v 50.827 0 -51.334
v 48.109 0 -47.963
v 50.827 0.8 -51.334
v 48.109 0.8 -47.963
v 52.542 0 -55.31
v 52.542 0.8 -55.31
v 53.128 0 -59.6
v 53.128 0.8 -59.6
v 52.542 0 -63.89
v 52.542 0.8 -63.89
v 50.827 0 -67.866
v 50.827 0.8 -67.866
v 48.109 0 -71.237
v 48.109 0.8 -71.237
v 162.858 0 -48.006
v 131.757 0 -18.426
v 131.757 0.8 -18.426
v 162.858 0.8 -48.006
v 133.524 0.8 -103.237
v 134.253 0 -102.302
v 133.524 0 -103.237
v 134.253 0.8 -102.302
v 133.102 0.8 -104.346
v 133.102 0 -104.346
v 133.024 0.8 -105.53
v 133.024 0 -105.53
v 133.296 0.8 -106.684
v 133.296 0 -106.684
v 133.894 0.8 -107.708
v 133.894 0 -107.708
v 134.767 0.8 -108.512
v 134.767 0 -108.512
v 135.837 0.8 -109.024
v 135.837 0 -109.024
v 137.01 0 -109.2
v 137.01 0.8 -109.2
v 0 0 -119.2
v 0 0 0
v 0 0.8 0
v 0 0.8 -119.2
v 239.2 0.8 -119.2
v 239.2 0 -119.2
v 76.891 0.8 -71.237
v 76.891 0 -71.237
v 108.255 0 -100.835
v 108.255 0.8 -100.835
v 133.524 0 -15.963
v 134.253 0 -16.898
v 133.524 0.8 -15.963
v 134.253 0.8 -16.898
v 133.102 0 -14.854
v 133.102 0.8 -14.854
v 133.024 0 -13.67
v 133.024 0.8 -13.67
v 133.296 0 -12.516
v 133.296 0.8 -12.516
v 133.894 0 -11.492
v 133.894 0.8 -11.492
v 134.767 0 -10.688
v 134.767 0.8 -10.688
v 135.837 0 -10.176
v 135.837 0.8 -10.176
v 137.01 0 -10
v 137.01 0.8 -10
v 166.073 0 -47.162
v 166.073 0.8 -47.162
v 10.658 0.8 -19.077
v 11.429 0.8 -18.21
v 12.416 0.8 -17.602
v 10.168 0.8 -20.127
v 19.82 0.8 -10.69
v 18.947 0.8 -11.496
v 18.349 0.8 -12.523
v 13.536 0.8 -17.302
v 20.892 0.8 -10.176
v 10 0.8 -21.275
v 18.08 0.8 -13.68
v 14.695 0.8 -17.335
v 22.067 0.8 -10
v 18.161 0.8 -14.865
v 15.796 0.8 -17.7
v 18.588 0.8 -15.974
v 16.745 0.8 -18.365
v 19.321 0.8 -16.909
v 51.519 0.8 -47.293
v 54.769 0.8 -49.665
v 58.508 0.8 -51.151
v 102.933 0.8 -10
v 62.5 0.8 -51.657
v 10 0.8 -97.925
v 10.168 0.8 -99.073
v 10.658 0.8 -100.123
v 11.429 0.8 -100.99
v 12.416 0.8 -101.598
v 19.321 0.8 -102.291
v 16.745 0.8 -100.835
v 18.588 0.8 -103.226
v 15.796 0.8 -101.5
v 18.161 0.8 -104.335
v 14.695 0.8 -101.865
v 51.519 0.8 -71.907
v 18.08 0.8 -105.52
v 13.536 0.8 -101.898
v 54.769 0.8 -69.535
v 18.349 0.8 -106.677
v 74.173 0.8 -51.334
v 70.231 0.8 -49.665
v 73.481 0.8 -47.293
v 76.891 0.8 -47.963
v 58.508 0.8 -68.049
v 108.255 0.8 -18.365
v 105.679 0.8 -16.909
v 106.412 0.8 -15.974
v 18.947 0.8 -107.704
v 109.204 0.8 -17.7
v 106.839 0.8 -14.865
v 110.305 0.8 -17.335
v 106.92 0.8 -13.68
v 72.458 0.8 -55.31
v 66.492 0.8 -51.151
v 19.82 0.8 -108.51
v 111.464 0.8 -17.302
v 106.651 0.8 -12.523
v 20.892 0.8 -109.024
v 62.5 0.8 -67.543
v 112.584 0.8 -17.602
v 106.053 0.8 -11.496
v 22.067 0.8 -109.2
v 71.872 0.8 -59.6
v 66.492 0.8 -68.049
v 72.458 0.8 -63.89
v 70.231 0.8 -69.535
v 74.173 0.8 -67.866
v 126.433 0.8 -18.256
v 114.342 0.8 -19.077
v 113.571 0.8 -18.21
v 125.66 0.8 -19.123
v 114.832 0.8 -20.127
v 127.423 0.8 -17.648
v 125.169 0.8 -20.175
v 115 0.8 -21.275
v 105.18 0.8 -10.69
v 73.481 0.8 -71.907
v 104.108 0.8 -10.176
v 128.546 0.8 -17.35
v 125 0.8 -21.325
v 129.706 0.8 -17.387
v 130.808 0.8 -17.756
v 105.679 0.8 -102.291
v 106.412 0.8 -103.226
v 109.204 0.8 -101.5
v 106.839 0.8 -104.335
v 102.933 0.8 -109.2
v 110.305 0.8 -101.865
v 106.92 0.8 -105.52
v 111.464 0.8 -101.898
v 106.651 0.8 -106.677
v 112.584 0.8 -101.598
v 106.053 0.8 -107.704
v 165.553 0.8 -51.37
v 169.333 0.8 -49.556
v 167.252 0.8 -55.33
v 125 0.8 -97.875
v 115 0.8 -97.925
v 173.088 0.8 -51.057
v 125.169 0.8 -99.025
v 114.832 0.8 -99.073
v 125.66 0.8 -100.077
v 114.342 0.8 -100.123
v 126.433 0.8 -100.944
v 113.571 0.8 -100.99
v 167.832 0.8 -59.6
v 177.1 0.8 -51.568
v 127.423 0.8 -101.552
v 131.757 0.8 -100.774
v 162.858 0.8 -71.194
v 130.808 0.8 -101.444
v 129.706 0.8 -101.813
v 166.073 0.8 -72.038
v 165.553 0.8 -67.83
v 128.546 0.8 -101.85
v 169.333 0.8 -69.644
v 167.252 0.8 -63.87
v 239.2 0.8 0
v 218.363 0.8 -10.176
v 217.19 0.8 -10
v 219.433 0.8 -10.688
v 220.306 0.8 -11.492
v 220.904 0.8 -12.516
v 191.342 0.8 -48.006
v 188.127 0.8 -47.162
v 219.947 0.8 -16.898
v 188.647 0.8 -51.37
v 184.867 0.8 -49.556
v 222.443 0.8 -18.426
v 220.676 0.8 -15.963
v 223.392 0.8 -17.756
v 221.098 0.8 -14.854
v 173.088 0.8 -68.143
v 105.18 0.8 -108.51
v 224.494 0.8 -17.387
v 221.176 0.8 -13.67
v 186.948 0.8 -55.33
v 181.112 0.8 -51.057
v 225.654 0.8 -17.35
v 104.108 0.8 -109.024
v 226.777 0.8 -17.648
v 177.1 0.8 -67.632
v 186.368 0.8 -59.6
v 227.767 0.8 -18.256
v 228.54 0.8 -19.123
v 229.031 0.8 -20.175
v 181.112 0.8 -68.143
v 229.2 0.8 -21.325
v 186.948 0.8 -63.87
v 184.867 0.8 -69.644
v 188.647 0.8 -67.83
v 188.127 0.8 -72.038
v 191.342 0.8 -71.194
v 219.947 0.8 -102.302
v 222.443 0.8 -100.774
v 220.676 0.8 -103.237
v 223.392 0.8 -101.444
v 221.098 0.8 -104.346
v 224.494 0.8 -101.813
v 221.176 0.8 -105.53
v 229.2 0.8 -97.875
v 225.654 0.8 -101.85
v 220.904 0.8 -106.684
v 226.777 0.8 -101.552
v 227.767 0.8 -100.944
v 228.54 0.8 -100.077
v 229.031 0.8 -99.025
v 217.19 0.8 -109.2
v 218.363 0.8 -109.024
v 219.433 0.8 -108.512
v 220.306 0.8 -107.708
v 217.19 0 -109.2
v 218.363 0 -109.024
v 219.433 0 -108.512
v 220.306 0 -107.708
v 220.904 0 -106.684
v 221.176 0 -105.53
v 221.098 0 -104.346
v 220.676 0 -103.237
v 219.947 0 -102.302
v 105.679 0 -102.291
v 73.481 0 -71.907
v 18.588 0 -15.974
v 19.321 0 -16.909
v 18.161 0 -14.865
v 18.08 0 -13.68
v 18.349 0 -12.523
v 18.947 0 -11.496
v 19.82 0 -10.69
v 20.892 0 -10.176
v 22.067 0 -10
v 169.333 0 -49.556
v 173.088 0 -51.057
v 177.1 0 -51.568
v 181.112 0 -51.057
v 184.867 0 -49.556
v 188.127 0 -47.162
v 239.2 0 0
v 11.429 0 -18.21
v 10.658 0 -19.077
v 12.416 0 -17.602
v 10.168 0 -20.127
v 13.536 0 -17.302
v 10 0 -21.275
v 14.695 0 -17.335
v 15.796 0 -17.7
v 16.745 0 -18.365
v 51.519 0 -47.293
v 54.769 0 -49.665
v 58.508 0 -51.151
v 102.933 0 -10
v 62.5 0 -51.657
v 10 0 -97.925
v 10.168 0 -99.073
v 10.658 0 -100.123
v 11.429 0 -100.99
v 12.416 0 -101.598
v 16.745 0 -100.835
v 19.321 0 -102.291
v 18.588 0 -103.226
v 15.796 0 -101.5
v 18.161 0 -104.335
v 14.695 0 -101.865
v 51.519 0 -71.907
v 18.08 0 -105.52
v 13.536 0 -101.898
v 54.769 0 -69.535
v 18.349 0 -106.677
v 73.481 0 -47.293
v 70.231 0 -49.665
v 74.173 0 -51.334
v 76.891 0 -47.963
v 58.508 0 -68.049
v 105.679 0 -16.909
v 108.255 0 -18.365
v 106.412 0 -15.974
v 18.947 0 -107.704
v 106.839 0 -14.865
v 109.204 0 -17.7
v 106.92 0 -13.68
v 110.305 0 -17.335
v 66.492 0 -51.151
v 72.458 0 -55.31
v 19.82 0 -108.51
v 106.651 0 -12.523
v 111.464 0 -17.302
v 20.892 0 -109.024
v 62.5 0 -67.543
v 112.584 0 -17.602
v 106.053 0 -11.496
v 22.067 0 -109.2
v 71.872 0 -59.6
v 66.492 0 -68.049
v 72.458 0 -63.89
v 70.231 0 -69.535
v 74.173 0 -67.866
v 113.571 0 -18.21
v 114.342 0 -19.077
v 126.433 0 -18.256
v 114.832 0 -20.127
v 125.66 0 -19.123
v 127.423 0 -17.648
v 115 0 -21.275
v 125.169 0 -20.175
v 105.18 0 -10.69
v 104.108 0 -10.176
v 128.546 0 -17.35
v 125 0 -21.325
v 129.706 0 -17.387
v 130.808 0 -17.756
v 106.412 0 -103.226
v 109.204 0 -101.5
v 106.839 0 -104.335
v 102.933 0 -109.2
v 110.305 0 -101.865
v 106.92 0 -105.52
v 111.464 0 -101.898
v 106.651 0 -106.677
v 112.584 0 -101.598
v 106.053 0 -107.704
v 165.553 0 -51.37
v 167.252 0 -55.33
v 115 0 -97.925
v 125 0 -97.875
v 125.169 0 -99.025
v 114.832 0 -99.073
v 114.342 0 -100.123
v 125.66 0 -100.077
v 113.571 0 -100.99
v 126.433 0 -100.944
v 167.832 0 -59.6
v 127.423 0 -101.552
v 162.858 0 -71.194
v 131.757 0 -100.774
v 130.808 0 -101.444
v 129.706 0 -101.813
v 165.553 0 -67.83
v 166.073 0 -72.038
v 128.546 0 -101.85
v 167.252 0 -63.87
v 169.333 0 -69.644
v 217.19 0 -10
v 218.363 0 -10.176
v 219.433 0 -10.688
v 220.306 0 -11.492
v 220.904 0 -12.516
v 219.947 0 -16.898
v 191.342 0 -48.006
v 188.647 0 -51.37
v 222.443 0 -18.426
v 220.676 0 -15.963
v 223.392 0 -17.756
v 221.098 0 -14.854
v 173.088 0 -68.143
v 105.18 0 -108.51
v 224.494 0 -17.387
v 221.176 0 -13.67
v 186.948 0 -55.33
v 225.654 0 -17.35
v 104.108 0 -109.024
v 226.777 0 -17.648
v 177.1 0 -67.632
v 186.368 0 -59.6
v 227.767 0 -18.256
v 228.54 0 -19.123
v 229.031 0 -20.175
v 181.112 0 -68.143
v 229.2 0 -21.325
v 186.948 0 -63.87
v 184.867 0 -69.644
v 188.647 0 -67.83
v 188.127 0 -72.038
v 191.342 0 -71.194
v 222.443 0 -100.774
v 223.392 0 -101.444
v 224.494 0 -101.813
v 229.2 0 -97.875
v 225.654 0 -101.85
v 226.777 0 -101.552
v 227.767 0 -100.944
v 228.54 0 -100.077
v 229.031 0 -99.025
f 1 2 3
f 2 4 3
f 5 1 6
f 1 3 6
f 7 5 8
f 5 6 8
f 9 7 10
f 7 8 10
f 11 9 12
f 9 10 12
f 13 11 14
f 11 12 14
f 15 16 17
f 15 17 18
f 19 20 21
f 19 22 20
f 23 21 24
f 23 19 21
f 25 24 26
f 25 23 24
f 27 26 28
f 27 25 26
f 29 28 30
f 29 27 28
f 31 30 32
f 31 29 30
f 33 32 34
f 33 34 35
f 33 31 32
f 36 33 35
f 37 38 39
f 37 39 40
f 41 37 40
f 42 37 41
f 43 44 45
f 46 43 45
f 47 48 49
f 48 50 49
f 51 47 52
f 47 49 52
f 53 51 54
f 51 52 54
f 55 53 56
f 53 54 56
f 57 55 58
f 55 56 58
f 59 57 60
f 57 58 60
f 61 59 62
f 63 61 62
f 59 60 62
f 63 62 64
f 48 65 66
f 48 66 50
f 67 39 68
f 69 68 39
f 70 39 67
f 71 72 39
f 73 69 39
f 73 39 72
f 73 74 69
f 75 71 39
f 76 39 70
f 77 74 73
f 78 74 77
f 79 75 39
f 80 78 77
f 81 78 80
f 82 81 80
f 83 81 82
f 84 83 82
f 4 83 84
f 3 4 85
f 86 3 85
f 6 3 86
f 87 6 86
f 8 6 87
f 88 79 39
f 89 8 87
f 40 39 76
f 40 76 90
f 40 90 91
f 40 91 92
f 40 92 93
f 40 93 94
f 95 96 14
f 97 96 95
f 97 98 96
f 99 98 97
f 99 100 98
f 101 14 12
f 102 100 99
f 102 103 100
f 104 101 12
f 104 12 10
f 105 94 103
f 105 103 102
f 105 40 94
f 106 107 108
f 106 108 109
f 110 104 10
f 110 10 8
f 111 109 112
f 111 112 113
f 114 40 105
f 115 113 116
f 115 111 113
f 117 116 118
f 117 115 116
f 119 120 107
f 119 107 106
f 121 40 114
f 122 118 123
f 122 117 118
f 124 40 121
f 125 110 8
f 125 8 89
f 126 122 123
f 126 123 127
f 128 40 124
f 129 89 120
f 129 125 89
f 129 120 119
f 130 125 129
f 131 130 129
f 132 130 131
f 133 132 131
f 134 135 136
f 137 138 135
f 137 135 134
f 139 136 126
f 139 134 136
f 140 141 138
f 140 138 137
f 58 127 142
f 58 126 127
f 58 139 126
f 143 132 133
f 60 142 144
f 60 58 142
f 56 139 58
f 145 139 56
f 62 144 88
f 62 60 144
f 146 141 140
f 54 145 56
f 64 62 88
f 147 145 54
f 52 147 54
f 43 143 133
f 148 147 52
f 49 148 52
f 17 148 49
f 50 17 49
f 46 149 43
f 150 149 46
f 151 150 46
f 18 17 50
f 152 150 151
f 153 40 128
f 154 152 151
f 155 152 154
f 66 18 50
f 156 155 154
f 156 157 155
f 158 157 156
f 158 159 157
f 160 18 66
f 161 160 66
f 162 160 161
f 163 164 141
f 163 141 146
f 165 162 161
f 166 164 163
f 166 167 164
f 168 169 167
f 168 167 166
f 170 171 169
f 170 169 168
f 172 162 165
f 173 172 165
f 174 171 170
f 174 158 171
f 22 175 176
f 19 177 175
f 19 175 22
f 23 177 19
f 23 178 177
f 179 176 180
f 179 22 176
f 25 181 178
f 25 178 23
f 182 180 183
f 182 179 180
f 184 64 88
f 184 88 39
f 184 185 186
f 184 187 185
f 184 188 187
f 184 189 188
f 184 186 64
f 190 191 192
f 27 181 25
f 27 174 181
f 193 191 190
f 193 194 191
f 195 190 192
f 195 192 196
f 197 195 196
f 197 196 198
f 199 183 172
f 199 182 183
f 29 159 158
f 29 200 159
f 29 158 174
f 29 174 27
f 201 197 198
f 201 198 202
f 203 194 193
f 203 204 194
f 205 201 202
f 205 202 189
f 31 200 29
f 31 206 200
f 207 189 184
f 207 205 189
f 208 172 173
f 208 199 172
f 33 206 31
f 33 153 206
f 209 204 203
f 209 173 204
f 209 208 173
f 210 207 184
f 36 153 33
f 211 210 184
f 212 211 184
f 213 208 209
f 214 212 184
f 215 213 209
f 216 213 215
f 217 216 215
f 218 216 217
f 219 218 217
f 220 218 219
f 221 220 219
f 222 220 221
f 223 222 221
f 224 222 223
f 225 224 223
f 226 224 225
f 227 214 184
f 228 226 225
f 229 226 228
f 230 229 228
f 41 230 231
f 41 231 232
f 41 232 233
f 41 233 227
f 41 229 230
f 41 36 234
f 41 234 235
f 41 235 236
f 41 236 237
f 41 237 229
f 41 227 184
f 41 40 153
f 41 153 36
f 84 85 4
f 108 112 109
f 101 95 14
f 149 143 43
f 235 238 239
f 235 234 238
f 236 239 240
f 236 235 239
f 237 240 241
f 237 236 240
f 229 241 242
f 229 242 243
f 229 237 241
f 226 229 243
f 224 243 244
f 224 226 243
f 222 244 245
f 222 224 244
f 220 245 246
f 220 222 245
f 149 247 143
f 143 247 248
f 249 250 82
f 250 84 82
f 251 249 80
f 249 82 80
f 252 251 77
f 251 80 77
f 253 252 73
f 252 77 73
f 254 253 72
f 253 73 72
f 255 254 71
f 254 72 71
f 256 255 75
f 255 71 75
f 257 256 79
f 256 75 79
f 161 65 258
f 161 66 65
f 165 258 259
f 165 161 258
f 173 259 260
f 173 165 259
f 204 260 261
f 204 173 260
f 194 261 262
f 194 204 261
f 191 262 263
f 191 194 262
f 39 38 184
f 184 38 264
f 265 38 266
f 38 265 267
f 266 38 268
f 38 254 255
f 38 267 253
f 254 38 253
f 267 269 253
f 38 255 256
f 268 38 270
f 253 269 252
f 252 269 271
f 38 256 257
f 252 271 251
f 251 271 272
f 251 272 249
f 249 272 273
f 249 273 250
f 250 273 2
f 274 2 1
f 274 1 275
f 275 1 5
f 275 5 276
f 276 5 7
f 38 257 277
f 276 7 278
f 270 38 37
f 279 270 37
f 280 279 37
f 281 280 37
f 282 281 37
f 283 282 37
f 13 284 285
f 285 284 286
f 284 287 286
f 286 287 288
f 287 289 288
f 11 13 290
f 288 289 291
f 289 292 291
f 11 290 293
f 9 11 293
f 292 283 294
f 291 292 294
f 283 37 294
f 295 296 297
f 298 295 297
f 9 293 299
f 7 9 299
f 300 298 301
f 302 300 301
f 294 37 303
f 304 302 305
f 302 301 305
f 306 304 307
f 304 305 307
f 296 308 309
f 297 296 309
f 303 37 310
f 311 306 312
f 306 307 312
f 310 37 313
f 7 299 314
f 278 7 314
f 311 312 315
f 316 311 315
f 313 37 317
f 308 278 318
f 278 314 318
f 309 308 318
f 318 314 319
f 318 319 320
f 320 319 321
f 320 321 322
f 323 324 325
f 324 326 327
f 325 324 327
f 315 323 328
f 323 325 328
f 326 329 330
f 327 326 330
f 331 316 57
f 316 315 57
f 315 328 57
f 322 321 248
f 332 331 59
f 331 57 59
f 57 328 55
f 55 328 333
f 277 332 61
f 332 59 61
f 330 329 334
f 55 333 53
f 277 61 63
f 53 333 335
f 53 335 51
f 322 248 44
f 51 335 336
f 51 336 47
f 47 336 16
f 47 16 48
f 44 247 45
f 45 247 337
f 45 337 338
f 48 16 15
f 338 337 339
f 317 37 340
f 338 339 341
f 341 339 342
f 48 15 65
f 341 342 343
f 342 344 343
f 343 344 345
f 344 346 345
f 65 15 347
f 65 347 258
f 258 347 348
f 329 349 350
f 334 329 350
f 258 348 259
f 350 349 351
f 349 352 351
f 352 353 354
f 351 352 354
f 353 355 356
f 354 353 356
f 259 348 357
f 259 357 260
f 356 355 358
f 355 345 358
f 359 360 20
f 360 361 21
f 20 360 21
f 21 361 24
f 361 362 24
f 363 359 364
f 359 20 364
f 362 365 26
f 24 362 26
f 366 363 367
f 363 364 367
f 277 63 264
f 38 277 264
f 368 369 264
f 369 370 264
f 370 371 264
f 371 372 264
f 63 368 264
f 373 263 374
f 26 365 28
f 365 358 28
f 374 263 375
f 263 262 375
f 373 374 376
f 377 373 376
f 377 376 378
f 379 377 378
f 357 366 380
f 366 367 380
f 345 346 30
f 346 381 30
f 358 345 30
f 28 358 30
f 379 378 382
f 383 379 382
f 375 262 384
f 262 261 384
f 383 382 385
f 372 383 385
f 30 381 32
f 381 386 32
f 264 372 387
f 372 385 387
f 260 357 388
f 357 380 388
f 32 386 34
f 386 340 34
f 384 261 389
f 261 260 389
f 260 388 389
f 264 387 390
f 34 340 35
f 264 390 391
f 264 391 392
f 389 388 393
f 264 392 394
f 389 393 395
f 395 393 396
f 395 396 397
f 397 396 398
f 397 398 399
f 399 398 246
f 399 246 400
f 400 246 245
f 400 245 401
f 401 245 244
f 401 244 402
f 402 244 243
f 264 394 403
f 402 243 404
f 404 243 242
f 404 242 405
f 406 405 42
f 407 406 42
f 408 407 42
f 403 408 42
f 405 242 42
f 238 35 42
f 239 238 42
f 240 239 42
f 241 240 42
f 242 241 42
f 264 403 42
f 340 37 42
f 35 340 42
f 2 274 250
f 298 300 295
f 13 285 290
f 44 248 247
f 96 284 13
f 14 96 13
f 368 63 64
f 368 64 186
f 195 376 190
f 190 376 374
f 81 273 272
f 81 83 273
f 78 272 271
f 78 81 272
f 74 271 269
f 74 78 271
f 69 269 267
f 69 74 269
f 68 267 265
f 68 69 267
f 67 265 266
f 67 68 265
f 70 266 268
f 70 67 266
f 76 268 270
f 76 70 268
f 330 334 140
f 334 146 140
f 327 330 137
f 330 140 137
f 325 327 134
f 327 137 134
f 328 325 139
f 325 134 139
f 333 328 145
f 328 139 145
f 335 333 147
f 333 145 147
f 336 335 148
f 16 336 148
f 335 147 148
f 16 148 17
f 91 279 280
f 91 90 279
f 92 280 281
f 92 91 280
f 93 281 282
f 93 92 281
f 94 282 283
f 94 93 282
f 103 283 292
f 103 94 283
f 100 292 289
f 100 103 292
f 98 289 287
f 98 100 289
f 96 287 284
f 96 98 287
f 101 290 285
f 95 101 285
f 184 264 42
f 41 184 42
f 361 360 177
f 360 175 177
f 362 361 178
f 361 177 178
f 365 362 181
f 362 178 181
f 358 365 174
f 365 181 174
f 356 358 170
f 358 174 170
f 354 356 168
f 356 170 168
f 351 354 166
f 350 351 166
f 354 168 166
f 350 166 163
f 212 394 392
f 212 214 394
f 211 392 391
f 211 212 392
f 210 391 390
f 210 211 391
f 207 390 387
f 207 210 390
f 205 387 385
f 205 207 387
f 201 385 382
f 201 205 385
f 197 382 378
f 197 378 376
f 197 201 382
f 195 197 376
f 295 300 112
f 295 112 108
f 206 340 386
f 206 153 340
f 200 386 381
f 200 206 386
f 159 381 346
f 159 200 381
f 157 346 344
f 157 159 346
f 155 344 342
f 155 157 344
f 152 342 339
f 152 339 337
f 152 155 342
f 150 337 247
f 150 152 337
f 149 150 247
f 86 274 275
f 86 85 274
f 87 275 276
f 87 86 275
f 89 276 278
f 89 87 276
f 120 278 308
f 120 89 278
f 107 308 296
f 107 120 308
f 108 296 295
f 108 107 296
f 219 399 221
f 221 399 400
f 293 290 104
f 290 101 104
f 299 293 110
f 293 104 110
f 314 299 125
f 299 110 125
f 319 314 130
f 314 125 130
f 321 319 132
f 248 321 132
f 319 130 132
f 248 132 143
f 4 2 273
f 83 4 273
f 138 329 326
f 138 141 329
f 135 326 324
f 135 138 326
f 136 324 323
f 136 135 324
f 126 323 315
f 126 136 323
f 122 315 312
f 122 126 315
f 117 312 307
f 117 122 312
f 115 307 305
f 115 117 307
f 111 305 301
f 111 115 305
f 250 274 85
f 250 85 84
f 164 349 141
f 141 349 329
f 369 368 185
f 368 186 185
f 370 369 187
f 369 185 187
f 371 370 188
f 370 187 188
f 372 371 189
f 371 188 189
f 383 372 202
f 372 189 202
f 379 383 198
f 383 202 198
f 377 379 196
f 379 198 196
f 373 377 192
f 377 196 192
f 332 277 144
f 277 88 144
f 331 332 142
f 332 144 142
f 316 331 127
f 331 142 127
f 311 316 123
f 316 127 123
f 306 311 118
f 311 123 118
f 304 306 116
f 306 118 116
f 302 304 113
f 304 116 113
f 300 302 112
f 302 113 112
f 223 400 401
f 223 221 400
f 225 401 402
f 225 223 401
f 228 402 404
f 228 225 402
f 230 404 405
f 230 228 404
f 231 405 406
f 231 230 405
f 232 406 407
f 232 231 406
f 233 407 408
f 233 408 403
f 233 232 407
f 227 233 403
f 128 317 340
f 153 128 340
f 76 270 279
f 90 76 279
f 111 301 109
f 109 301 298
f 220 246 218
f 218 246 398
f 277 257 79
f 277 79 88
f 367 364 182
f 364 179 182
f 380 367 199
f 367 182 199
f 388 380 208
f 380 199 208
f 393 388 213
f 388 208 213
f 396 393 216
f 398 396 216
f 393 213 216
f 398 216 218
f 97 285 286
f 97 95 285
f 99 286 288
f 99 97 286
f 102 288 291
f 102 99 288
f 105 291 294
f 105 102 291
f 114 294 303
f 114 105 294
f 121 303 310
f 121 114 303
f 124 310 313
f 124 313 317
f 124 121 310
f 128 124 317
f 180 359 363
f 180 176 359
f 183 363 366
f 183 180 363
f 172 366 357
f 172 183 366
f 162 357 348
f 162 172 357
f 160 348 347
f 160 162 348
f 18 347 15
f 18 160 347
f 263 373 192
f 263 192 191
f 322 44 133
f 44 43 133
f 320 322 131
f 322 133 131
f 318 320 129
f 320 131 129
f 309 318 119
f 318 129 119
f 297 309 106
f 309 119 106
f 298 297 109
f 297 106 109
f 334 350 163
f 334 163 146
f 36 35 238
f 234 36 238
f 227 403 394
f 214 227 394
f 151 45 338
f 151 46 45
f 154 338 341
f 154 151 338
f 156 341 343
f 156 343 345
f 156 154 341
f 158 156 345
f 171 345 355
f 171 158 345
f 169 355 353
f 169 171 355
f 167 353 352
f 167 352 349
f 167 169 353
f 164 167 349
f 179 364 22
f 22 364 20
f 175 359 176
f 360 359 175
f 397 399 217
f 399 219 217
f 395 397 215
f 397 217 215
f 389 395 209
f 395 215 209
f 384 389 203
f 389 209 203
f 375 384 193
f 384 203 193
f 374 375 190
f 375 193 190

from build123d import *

# Parameters (mm, degrees)
SKETCH1_W           = 239.2
SKETCH1_H           = 119.2
BOSS_EXTRUDE1_DEPTH = 0.8
FILLET2_R           = 16
FILLET3_R           = 4


with BuildPart() as part:
    # Sketch1 → Boss-Extrude1 (new body)
    with BuildSketch(Plane(origin=(0, 0, 0), x_dir=(1, 0, 0), z_dir=(0, 1, 0))):
        with Locations((119.6, 59.6)):
            Rectangle(SKETCH1_W, SKETCH1_H)
        Polygon((10, 107.2), (60.440329218, 59.6), (10, 12), align=None, mode=Mode.SUBTRACT)
        Polygon((12, 109.2), (113, 109.2), (62.5, 61.54368932), align=None, mode=Mode.SUBTRACT)
        Polygon((12, 10), (113, 10), (62.5, 57.65631068), align=None, mode=Mode.SUBTRACT)
        Polygon((115, 107.2), (115, 12), (64.559670782, 59.6), align=None, mode=Mode.SUBTRACT)
        Polygon((127, 109.2), (227.2, 109.2), (177.1, 61.551076321), align=None, mode=Mode.SUBTRACT)
        Polygon((125, 107.2), (125, 12), (175.048559671, 59.6), align=None, mode=Mode.SUBTRACT)
        Polygon((127, 10), (227.2, 10), (177.1, 57.648923679), align=None, mode=Mode.SUBTRACT)
        Polygon((229.2, 107.2), (229.2, 12), (179.151440329, 59.6), align=None, mode=Mode.SUBTRACT)
    extrude(amount=BOSS_EXTRUDE1_DEPTH)

    # Fillet2
    fillet2_edges = [part.edges().sort_by_distance(p)[0] for p in [
        (62.5, 0.4, -61.54368932),
        (60.440329218, 0.4, -59.6),
        (175.048559671, 0.4, -59.6),
        (177.1, 0.4, -57.648923679),
        (177.1, 0.4, -61.551076321),
        (62.5, 0.4, -57.65631068),
        (64.559670782, 0.4, -59.6),
        (179.151440329, 0.4, -59.6),
    ]]
    fillet(fillet2_edges, radius=FILLET2_R)

    # Fillet3
    fillet3_edges = [part.edges().sort_by_distance(p)[0] for p in [
        (113, 0.4, -109.2),
        (12, 0.4, -109.2),
        (10, 0.4, -12),
        (10, 0.4, -107.2),
        (125, 0.4, -107.2),
        (125, 0.4, -12),
        (227.2, 0.4, -10),
        (127, 0.4, -10),
        (227.2, 0.4, -109.2),
        (127, 0.4, -109.2),
        (113, 0.4, -10),
        (12, 0.4, -10),
        (115, 0.4, -12),
        (115, 0.4, -107.2),
        (229.2, 0.4, -12),
        (229.2, 0.4, -107.2),
    ]]
    fillet(fillet3_edges, radius=FILLET3_R)


solid = part.part
